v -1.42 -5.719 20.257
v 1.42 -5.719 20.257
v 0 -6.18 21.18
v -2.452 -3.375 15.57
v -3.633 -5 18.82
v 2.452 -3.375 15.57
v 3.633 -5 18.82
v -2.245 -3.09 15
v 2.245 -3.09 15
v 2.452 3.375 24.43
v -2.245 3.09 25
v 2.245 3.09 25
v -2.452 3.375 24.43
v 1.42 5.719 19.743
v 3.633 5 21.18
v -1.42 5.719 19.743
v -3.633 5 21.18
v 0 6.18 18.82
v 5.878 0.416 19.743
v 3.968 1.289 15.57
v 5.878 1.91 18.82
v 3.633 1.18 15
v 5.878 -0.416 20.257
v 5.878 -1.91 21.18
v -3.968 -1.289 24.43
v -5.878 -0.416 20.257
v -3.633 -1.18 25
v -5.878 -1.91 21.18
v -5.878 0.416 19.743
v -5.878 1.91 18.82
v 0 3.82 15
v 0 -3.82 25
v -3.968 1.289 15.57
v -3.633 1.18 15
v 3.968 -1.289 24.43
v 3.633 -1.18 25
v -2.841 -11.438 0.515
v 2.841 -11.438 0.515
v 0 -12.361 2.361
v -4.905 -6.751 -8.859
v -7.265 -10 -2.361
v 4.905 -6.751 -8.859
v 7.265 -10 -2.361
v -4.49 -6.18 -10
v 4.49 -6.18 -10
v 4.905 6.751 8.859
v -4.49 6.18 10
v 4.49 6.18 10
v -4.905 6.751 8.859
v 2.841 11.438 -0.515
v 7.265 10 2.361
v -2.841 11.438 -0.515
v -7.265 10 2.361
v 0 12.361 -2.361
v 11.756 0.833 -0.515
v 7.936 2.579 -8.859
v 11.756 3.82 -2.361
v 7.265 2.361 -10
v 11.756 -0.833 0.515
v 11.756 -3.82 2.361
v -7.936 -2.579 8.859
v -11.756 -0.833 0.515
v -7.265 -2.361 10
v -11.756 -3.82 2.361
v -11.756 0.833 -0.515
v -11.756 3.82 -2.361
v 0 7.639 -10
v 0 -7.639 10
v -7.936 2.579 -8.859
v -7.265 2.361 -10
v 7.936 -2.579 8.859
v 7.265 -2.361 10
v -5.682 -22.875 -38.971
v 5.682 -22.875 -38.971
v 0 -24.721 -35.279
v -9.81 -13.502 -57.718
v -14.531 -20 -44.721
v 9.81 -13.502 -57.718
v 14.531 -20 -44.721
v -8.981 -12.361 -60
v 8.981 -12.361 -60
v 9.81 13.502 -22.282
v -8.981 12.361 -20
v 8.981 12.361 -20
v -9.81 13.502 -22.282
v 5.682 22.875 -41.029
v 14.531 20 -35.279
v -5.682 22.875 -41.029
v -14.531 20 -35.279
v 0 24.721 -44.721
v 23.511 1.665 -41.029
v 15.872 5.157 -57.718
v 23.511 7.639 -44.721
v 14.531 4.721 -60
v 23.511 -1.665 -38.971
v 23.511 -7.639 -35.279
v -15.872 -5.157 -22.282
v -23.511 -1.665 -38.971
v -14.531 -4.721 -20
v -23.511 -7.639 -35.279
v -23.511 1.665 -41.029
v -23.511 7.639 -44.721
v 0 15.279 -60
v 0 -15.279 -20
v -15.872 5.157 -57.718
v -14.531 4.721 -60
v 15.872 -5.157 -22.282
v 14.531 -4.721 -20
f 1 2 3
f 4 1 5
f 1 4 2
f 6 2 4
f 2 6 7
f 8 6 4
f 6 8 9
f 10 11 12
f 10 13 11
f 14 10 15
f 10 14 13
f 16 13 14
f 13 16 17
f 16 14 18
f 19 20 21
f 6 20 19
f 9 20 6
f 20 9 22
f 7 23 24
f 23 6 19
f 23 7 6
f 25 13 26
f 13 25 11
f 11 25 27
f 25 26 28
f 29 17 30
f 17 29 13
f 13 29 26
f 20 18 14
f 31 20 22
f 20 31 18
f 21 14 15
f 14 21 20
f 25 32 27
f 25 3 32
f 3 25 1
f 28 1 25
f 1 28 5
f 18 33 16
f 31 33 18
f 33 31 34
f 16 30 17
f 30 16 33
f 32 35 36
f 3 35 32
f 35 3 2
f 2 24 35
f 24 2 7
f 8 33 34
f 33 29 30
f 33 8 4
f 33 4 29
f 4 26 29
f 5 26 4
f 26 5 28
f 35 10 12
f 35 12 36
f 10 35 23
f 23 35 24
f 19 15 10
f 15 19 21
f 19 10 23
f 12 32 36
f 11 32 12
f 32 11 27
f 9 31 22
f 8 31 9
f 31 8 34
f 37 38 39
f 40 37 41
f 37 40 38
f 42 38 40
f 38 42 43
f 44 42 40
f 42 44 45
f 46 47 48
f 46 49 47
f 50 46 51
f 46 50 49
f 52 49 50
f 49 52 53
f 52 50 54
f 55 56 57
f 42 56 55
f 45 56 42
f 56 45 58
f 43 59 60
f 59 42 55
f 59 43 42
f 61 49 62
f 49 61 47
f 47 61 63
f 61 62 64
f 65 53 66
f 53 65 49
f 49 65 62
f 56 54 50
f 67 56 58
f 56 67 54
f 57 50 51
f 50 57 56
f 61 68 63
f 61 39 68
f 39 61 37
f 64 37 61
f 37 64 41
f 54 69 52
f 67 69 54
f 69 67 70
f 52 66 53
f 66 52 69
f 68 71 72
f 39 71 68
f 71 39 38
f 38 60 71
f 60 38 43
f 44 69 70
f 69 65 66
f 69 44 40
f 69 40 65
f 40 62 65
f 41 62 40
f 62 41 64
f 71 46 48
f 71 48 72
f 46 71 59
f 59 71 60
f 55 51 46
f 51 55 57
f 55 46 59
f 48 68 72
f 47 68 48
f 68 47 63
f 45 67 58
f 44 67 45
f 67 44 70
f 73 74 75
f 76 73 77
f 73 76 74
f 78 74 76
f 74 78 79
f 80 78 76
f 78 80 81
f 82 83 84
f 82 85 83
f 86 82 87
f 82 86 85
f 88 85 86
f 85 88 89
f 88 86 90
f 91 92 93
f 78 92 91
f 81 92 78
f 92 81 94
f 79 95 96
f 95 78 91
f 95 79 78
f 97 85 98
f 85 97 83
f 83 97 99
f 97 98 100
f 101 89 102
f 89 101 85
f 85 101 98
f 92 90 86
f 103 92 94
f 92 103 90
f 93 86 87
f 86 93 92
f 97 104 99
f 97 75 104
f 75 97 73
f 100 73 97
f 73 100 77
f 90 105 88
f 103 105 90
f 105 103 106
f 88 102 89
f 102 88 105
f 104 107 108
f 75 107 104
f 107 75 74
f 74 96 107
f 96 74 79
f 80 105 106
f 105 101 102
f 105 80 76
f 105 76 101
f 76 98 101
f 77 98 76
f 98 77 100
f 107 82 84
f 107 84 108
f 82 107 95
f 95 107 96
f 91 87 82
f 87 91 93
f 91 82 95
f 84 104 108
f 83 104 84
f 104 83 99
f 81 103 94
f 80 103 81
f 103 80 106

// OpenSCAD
module dodecahedron(height) {
	scale([height, height, height]) {
		intersection() {
			cube([2, 2, 1], center = true);
			intersection_for(i = [0:4]) {
				rotate([0, 0, 72*i])
				rotate([116.565, 0, 0])
				cube([2, 2, 1], center = true);
			}
		}
	}

}

translate([0, 0, 20]) dodecahedron(10);
dodecahedron(20);
translate([0, 0, -40]) dodecahedron(40);
